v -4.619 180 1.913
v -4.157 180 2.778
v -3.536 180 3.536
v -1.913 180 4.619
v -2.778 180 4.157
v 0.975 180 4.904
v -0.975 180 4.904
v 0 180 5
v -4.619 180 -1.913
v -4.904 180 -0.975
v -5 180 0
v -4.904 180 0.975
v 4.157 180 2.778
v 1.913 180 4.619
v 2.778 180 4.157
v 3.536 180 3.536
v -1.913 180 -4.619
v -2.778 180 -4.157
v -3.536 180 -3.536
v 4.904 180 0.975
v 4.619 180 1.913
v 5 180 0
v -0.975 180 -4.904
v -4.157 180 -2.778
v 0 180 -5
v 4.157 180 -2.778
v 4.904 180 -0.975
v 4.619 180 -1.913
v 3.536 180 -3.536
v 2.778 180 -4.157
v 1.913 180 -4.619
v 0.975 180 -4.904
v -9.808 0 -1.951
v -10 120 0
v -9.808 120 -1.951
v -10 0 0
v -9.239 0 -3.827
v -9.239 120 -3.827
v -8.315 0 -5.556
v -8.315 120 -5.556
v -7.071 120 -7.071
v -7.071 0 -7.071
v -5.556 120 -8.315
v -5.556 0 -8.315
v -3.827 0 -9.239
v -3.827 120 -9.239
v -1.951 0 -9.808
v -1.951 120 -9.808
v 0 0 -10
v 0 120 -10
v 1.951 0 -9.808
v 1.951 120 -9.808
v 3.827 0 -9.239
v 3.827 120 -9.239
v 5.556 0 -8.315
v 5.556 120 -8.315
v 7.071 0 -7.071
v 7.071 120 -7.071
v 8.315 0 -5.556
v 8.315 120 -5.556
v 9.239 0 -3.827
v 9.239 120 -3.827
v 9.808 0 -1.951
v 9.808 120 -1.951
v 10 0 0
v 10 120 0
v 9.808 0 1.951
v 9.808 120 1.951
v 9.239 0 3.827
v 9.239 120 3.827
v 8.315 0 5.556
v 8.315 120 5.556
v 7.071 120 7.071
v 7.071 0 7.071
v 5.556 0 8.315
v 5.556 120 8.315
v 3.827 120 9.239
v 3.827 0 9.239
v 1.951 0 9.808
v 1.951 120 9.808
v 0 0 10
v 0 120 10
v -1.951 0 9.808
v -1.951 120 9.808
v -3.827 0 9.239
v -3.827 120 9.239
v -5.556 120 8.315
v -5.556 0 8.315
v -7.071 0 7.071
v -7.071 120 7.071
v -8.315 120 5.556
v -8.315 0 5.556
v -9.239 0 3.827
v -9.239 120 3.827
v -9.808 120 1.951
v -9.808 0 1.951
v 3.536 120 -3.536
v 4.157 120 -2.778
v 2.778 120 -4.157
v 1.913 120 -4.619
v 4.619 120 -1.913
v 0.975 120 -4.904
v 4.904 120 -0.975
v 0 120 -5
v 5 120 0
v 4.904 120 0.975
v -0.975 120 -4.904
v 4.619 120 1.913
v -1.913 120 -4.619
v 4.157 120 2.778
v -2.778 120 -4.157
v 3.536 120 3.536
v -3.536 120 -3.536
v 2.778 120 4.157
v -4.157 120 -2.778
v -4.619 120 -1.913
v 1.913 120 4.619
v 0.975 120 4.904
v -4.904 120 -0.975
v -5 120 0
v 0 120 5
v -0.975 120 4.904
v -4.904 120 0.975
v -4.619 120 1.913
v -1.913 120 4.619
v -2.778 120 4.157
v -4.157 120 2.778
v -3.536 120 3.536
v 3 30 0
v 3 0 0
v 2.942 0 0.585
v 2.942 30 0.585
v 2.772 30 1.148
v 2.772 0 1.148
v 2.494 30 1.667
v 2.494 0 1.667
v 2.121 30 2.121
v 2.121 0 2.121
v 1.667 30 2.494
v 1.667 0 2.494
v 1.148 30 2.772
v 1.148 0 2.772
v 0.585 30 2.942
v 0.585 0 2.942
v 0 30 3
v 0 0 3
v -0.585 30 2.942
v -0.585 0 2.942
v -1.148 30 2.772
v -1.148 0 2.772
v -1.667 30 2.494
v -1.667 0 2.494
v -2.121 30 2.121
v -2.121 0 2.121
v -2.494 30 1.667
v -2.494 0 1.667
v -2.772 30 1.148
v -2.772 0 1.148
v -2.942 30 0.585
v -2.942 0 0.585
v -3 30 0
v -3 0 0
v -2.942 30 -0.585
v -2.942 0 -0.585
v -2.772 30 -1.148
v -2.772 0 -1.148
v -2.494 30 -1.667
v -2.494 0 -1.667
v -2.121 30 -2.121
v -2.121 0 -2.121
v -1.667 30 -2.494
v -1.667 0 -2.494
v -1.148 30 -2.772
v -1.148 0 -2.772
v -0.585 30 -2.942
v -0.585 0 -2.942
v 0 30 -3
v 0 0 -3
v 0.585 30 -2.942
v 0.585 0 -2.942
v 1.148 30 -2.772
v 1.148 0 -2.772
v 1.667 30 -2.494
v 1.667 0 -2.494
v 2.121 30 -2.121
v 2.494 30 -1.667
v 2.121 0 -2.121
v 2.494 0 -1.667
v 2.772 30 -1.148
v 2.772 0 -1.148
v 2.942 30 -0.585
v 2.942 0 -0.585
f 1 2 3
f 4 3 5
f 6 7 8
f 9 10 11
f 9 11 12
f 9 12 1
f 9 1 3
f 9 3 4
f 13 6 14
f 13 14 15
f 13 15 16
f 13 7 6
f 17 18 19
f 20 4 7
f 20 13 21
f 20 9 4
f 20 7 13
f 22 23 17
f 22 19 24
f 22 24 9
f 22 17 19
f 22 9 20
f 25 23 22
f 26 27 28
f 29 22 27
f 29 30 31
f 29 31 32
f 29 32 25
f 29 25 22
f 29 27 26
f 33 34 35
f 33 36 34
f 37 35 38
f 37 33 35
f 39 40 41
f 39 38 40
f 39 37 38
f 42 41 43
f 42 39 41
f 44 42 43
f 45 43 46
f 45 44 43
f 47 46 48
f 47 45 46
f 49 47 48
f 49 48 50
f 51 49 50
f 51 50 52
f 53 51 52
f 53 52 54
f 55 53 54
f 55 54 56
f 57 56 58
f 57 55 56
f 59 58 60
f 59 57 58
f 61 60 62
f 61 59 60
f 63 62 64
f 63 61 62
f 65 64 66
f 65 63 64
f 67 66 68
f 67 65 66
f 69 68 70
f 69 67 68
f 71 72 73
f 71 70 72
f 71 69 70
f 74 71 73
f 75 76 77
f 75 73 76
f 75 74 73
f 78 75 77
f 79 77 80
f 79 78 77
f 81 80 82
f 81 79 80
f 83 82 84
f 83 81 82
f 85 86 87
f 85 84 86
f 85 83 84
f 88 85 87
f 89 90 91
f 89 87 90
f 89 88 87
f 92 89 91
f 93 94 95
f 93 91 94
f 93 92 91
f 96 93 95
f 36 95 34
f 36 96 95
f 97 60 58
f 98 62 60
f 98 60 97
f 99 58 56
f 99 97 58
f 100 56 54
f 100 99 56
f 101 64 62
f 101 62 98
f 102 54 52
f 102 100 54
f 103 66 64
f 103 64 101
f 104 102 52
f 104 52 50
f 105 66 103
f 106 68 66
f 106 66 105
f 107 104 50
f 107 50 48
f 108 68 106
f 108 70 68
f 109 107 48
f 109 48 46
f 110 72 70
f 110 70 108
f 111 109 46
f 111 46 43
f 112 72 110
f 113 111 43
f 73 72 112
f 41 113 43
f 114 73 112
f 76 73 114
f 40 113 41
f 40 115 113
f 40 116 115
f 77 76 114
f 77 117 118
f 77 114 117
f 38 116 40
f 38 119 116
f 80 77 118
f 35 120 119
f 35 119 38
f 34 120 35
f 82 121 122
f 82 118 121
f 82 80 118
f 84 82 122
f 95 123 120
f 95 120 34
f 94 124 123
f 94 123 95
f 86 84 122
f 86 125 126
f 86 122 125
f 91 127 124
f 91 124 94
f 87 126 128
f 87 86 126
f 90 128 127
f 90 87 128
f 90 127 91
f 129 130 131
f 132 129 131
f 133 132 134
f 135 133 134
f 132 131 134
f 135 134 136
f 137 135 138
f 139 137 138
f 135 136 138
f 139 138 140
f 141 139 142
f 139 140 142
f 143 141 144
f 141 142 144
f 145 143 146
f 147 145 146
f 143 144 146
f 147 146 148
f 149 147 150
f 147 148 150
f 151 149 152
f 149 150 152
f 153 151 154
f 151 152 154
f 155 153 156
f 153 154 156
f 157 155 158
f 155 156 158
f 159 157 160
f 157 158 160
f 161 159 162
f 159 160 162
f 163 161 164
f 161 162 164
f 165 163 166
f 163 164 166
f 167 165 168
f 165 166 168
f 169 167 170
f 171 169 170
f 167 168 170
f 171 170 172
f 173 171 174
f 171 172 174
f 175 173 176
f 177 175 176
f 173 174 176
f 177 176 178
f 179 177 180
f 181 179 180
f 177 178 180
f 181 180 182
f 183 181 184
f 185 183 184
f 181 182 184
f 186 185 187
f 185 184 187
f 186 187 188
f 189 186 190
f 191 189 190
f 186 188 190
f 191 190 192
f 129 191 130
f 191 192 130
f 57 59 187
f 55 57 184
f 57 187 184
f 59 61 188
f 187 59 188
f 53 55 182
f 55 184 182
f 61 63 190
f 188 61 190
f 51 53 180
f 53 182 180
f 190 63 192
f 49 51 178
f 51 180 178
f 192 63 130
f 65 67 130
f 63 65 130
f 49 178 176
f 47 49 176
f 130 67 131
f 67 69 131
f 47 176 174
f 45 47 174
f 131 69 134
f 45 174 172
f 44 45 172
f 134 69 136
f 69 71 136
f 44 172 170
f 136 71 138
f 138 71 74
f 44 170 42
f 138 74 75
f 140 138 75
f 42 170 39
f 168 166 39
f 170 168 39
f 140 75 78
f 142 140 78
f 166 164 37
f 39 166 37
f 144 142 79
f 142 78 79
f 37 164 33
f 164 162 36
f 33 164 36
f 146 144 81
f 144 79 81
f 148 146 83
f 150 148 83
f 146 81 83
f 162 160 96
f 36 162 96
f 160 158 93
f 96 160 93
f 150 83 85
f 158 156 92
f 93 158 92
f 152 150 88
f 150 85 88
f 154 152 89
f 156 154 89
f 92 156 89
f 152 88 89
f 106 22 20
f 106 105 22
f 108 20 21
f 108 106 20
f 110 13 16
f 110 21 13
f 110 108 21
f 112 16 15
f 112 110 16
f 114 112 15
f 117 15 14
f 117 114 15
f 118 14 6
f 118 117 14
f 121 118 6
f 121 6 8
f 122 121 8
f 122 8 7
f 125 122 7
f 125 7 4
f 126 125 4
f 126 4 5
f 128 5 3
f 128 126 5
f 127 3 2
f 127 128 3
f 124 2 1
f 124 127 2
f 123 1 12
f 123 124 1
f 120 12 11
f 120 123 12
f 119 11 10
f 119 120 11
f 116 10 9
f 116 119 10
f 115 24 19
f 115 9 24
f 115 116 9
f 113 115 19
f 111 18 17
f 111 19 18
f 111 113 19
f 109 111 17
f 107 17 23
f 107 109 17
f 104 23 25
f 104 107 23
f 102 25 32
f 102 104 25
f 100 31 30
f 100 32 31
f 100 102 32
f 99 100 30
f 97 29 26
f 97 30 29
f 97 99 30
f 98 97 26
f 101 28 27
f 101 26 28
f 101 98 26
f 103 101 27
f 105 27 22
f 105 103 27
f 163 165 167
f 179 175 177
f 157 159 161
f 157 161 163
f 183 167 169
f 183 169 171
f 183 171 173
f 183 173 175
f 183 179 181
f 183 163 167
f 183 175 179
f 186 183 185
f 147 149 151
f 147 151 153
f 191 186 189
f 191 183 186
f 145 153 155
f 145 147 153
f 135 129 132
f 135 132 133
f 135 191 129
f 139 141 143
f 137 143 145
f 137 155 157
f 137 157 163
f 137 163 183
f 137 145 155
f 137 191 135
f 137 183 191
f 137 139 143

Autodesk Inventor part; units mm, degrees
ref_plane "YZ Plane" through (0, 0, 0) normal (1, 0, 0) x (0, 1, 0)
ref_plane "XZ Plane" through (0, 0, 0) normal (0, 1, 0) x (-1, 0, 0)
ref_plane "XY Plane" through (0, 0, 0) normal (0, 0, 1) x (1, 0, 0)
sketch "Sketch1" plane through (0, 0, 0) normal (0, 1, 0) x (-1, 0, 0)
  circle A0 centre (0, 0) radius 10
  dimension "d0" = 20
extrude "Extrusion1" add sketch "Sketch1" along normal blind 120
sketch "Sketch2" plane through (0, 120, 0) normal (0, 1, 0) x (1, 0, 0)
  circle A0 centre (0, 0) radius 5
  dimension "d3" = 10
extrude "Extrusion2" add sketch "Sketch2" along normal blind 60
thread "Thread1" size "M10x1.5" class "6g" standard "ANSI Metric M Profile" full length
sketch "Sketch3" plane through (0, 0, 0) normal (0, -1, 0) x (1, 0, 0)
  circle A0 centre (0, 0) radius 3
  dimension "d8" = 6
extrude "Extrusion3" cut sketch "Sketch3" against normal blind 30
properties part number "center" material "Steel, Mild"
